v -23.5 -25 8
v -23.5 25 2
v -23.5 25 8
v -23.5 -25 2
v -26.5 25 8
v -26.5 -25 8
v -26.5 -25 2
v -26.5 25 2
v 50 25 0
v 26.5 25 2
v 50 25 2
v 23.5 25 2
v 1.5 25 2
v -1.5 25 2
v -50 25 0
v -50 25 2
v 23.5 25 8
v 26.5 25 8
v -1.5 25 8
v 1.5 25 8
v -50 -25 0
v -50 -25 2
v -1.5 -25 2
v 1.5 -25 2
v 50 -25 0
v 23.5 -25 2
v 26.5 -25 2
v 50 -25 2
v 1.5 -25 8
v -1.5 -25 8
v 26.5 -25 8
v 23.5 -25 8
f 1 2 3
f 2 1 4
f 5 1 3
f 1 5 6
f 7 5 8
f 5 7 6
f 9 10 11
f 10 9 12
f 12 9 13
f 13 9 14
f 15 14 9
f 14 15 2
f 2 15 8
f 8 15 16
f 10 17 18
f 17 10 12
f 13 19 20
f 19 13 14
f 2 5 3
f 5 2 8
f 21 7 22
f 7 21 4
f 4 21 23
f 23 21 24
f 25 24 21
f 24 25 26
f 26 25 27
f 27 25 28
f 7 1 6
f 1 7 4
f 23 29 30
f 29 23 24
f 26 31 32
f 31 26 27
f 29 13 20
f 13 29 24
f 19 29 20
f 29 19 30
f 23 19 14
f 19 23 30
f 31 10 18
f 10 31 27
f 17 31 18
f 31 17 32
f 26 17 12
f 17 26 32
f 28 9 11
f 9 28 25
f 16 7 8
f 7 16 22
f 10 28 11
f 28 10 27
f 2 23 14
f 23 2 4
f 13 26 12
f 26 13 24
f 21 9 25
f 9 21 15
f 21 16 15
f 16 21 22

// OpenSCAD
// Stiffened cover panel
plate_len   = 100;  // plate length (X)
plate_wid   = 50;   // plate width (Y)
plate_thk   = 2;    // plate thickness (Z)

rib_count   = 3;    // number of ribs
rib_thk     = 3;    // rib thickness (X)
rib_h       = 6;    // rib height above plate (Z)
rib_pitch   = 25;   // centre-to-centre rib spacing (X)
overlap     = 0.01; // small overlap so ribs fuse with plate

union() {
    // Base plate
    translate([-plate_len/2, -plate_wid/2, 0])
        cube([plate_len, plate_wid, plate_thk]);

    // Ribs
    for (i = [0 : rib_count - 1]) {
        x_c = (i - (rib_count - 1)/2) * rib_pitch;
        translate([x_c - rib_thk/2, -plate_wid/2, plate_thk - overlap])
            cube([rib_thk, plate_wid, rib_h + overlap]);
    }
}
